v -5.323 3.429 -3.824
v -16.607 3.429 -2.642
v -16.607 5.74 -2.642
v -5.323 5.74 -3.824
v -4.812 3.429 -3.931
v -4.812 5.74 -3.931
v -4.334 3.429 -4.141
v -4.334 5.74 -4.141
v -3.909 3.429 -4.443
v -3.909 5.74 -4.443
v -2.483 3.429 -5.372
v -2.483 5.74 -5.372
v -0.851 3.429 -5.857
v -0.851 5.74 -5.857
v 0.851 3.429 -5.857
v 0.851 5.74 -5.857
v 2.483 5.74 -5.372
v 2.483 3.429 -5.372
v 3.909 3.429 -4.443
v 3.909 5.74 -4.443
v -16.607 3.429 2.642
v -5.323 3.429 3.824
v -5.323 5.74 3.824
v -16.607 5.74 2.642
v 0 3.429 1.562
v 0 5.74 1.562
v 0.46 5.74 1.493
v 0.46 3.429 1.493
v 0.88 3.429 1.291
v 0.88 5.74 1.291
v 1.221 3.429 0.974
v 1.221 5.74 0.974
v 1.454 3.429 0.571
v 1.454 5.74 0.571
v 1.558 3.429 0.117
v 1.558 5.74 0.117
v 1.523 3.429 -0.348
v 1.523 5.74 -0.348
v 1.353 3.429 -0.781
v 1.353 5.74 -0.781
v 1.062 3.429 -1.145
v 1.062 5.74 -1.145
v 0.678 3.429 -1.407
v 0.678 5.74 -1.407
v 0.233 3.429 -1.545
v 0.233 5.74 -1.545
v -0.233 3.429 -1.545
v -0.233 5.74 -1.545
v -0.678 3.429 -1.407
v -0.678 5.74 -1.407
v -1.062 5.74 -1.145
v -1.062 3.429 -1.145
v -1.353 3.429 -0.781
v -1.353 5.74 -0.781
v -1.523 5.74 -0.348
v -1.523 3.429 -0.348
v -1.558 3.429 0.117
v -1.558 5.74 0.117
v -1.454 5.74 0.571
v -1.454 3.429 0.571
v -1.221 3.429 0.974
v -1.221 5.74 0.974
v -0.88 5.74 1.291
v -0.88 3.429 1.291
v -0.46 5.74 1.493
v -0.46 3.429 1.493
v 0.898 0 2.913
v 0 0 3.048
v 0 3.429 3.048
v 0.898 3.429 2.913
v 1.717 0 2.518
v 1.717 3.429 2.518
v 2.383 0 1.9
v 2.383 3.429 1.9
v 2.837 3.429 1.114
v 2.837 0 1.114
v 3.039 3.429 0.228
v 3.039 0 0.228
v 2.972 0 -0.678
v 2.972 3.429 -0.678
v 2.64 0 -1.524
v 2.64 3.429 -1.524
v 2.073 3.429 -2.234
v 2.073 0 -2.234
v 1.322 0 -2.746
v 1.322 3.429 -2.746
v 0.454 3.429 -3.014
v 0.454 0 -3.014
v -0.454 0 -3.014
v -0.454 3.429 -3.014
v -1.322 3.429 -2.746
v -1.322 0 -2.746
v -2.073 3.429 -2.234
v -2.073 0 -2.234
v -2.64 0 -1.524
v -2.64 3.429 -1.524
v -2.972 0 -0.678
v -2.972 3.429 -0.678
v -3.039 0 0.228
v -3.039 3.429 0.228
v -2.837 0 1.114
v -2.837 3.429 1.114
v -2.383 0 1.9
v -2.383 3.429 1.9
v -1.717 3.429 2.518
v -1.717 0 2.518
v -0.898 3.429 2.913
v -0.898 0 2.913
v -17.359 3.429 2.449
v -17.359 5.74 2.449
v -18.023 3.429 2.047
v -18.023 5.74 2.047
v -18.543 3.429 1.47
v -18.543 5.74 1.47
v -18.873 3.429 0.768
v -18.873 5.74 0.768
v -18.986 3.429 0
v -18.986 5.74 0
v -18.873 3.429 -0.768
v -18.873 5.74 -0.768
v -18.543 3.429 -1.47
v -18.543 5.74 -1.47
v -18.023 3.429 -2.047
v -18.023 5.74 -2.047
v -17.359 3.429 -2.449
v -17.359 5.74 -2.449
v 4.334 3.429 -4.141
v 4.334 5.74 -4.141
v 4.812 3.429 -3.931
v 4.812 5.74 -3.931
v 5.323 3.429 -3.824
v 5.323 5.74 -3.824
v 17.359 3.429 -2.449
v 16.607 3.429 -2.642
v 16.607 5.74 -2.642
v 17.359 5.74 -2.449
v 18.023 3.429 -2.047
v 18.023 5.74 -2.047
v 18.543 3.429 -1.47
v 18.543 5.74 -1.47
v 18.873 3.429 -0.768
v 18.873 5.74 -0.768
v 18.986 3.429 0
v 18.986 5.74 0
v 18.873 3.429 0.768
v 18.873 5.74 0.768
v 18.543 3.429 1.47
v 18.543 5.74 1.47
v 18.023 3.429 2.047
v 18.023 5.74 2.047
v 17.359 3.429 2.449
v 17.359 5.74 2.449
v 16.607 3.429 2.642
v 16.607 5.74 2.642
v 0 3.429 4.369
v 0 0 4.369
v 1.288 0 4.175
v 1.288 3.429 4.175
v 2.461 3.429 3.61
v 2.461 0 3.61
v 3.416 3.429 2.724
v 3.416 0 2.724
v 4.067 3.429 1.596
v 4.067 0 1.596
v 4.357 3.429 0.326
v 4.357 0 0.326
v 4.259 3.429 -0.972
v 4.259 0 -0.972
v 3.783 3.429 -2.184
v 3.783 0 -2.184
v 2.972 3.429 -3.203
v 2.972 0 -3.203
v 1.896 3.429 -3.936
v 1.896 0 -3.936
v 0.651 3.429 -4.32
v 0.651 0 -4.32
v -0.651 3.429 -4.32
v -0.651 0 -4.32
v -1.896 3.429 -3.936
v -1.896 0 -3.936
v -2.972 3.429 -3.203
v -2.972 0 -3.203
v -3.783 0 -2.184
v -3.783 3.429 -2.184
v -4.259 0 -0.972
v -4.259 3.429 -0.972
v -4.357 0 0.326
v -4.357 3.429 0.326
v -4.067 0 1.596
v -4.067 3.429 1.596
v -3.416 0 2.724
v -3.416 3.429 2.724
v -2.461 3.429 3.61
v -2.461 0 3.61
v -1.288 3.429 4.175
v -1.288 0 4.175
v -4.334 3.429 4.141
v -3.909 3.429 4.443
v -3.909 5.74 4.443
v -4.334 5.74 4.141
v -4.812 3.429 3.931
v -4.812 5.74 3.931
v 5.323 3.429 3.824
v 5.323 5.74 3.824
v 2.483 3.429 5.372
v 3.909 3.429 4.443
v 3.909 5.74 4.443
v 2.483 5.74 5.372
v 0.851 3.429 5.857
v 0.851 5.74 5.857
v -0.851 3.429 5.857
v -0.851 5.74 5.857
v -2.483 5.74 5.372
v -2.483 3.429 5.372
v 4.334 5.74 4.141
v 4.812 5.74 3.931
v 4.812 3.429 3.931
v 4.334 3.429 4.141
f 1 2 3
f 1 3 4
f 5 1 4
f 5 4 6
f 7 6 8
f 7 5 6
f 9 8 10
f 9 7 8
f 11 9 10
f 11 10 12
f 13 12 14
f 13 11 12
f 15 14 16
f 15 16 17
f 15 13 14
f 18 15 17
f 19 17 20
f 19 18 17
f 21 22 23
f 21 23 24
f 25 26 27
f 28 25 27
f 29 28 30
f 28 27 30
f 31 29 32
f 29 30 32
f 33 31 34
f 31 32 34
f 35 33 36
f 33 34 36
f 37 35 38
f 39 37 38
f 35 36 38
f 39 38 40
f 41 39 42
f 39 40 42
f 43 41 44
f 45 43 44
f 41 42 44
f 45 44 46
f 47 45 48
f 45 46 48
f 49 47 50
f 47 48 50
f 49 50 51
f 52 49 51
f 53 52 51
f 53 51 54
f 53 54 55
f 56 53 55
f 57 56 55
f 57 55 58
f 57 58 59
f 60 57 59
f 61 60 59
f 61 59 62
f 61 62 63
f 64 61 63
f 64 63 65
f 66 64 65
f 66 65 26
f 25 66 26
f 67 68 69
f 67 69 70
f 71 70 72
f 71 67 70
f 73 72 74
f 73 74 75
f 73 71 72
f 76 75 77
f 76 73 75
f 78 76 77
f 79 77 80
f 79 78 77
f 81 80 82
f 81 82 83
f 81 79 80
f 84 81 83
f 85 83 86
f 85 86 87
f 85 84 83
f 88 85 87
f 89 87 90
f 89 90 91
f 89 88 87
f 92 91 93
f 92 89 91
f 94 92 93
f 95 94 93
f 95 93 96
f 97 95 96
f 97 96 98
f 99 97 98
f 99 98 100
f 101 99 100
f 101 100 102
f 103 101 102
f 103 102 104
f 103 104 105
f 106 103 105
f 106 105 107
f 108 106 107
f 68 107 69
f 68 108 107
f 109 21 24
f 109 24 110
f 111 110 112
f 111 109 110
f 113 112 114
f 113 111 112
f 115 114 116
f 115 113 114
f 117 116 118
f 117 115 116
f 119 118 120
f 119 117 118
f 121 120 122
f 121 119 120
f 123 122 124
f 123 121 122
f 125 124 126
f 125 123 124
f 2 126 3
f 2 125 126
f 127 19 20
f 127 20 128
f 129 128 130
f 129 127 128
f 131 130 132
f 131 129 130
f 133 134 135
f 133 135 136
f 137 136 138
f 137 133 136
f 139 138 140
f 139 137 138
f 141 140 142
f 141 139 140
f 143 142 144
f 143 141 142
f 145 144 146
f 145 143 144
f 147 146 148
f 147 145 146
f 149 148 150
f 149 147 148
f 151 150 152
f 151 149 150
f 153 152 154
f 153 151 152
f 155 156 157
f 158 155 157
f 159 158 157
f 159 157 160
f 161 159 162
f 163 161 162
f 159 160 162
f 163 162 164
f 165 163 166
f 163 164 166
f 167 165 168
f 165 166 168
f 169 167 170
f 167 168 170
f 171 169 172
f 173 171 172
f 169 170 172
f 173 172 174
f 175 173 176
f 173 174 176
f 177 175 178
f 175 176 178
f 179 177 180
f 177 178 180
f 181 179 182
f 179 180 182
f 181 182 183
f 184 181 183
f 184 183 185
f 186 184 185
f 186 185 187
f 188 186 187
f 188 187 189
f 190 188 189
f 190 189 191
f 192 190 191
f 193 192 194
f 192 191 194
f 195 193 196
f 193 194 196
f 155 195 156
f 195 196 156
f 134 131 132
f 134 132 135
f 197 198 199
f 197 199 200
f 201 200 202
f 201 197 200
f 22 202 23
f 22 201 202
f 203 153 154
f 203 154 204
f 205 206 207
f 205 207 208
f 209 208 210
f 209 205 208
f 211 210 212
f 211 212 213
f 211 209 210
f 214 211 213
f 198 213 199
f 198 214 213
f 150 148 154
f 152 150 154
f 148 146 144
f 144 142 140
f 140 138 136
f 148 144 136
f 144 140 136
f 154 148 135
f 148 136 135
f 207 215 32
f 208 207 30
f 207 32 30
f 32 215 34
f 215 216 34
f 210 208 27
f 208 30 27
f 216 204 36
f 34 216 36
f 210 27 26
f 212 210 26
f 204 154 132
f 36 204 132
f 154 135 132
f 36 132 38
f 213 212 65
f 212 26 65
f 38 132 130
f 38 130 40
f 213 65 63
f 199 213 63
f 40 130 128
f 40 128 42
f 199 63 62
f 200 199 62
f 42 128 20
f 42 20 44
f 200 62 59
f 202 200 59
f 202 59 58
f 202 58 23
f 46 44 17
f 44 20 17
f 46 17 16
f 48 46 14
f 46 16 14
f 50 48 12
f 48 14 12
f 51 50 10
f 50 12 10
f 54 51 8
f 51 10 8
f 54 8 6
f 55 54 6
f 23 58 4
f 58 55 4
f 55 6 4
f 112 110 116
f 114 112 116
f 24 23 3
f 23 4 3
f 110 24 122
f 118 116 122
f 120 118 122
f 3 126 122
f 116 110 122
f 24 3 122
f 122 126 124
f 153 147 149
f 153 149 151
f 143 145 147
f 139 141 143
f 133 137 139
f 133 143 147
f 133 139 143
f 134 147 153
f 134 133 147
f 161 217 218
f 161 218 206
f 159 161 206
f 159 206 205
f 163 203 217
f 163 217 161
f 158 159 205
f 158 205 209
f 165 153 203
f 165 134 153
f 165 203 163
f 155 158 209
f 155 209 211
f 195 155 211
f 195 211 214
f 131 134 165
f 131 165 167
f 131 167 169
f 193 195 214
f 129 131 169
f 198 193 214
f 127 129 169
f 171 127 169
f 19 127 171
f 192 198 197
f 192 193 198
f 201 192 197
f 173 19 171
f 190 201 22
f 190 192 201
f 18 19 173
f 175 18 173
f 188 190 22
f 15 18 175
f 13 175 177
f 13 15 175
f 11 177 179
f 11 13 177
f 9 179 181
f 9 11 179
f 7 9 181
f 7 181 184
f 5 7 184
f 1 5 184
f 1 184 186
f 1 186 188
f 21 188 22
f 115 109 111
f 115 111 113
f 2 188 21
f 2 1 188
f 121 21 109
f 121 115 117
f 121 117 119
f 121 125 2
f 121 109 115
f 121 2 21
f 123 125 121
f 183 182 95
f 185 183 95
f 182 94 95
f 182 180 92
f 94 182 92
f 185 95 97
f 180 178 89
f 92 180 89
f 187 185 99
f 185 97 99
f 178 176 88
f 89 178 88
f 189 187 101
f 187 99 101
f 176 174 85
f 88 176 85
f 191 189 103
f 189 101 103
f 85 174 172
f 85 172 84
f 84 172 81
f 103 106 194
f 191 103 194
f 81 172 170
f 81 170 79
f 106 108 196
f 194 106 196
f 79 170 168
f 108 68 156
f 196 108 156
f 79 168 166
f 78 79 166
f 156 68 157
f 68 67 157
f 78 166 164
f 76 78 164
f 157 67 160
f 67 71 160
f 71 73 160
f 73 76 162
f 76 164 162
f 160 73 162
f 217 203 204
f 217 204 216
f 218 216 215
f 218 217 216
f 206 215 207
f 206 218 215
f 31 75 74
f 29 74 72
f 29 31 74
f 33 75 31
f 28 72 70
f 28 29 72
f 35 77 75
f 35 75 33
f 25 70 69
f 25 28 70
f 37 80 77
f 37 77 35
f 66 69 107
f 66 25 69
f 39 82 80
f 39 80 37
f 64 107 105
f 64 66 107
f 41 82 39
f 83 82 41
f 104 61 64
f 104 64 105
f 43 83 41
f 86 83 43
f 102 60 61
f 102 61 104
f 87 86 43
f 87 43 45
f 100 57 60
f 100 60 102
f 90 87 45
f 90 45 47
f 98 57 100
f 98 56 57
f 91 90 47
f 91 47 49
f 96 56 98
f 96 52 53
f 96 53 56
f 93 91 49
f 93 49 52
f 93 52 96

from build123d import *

# Parameters (mm, degrees)
SKETCH1_R           = 4.3688
SKETCH1_R_2         = 3.048
BOSS_EXTRUDE1_DEPTH = 3.429
BOSS_EXTRUDE2_DEPTH = 2.3114
SKETCH3_R           = 1.5621
CUT_EXTRUDE1_DEPTH  = 21.699383219


with BuildPart() as part:
    # Sketch1 → Boss-Extrude1 (new body)
    with BuildSketch(Plane(origin=(0, 0, 0), x_dir=(1, 0, 0), z_dir=(0, 1, 0))):
        with Locations(Location((0, 0, 0), (0, 0, 270))):
            Circle(SKETCH1_R)
        with Locations(Location((0, 0, 0), (0, 0, 270))):
            Circle(SKETCH1_R_2, mode=Mode.SUBTRACT)
    extrude(amount=BOSS_EXTRUDE1_DEPTH)

    # Sketch2 → Boss-Extrude2 (add)
    with BuildSketch(Plane(origin=(0, 3.429, 0), x_dir=(1, 0, 0), z_dir=(0, 1, 0))):
        with BuildLine():
            Line((5.322708788, 3.823825598), (16.607191493, 2.6416))
            ThreePointArc((16.607191493, 2.6416), (18.9865, 0), (16.607191493, -2.6416))
            Line((16.607191493, -2.6416), (5.322708788, -3.823825598))
            ThreePointArc((5.322708788, -3.823825598), (4.567932808, -4.023552477), (3.909477587, -4.443093093))
            ThreePointArc((3.909477587, -4.443093093), (0, -5.9182), (-3.909477587, -4.443093093))
            ThreePointArc((-3.909477587, -4.443093093), (-4.567932808, -4.023552477), (-5.322708788, -3.823825598))
            Line((-5.322708788, -3.823825598), (-16.607191493, -2.6416))
            ThreePointArc((-16.607191493, -2.6416), (-18.9865, 0), (-16.607191493, 2.6416))
            Line((-16.607191493, 2.6416), (-5.322708788, 3.823825598))
            ThreePointArc((-5.322708788, 3.823825598), (-4.567932808, 4.023552477), (-3.909477587, 4.443093093))
            ThreePointArc((-3.909477587, 4.443093093), (0, 5.9182), (3.909477587, 4.443093093))
            ThreePointArc((3.909477587, 4.443093093), (4.567932808, 4.023552477), (5.322708788, 3.823825598))
        make_face()
    extrude(amount=BOSS_EXTRUDE2_DEPTH)

    # Sketch3 → Cut-Extrude1 (cut, through all)
    with BuildSketch(Plane(origin=(0, 5.7404, 0), x_dir=(1, 0, 0), z_dir=(0, 1, 0))):
        with Locations(Location((0, 0, 0), (0, 0, 270))):
            Circle(SKETCH3_R)
    extrude(amount=-CUT_EXTRUDE1_DEPTH, mode=Mode.SUBTRACT)


solid = part.part
